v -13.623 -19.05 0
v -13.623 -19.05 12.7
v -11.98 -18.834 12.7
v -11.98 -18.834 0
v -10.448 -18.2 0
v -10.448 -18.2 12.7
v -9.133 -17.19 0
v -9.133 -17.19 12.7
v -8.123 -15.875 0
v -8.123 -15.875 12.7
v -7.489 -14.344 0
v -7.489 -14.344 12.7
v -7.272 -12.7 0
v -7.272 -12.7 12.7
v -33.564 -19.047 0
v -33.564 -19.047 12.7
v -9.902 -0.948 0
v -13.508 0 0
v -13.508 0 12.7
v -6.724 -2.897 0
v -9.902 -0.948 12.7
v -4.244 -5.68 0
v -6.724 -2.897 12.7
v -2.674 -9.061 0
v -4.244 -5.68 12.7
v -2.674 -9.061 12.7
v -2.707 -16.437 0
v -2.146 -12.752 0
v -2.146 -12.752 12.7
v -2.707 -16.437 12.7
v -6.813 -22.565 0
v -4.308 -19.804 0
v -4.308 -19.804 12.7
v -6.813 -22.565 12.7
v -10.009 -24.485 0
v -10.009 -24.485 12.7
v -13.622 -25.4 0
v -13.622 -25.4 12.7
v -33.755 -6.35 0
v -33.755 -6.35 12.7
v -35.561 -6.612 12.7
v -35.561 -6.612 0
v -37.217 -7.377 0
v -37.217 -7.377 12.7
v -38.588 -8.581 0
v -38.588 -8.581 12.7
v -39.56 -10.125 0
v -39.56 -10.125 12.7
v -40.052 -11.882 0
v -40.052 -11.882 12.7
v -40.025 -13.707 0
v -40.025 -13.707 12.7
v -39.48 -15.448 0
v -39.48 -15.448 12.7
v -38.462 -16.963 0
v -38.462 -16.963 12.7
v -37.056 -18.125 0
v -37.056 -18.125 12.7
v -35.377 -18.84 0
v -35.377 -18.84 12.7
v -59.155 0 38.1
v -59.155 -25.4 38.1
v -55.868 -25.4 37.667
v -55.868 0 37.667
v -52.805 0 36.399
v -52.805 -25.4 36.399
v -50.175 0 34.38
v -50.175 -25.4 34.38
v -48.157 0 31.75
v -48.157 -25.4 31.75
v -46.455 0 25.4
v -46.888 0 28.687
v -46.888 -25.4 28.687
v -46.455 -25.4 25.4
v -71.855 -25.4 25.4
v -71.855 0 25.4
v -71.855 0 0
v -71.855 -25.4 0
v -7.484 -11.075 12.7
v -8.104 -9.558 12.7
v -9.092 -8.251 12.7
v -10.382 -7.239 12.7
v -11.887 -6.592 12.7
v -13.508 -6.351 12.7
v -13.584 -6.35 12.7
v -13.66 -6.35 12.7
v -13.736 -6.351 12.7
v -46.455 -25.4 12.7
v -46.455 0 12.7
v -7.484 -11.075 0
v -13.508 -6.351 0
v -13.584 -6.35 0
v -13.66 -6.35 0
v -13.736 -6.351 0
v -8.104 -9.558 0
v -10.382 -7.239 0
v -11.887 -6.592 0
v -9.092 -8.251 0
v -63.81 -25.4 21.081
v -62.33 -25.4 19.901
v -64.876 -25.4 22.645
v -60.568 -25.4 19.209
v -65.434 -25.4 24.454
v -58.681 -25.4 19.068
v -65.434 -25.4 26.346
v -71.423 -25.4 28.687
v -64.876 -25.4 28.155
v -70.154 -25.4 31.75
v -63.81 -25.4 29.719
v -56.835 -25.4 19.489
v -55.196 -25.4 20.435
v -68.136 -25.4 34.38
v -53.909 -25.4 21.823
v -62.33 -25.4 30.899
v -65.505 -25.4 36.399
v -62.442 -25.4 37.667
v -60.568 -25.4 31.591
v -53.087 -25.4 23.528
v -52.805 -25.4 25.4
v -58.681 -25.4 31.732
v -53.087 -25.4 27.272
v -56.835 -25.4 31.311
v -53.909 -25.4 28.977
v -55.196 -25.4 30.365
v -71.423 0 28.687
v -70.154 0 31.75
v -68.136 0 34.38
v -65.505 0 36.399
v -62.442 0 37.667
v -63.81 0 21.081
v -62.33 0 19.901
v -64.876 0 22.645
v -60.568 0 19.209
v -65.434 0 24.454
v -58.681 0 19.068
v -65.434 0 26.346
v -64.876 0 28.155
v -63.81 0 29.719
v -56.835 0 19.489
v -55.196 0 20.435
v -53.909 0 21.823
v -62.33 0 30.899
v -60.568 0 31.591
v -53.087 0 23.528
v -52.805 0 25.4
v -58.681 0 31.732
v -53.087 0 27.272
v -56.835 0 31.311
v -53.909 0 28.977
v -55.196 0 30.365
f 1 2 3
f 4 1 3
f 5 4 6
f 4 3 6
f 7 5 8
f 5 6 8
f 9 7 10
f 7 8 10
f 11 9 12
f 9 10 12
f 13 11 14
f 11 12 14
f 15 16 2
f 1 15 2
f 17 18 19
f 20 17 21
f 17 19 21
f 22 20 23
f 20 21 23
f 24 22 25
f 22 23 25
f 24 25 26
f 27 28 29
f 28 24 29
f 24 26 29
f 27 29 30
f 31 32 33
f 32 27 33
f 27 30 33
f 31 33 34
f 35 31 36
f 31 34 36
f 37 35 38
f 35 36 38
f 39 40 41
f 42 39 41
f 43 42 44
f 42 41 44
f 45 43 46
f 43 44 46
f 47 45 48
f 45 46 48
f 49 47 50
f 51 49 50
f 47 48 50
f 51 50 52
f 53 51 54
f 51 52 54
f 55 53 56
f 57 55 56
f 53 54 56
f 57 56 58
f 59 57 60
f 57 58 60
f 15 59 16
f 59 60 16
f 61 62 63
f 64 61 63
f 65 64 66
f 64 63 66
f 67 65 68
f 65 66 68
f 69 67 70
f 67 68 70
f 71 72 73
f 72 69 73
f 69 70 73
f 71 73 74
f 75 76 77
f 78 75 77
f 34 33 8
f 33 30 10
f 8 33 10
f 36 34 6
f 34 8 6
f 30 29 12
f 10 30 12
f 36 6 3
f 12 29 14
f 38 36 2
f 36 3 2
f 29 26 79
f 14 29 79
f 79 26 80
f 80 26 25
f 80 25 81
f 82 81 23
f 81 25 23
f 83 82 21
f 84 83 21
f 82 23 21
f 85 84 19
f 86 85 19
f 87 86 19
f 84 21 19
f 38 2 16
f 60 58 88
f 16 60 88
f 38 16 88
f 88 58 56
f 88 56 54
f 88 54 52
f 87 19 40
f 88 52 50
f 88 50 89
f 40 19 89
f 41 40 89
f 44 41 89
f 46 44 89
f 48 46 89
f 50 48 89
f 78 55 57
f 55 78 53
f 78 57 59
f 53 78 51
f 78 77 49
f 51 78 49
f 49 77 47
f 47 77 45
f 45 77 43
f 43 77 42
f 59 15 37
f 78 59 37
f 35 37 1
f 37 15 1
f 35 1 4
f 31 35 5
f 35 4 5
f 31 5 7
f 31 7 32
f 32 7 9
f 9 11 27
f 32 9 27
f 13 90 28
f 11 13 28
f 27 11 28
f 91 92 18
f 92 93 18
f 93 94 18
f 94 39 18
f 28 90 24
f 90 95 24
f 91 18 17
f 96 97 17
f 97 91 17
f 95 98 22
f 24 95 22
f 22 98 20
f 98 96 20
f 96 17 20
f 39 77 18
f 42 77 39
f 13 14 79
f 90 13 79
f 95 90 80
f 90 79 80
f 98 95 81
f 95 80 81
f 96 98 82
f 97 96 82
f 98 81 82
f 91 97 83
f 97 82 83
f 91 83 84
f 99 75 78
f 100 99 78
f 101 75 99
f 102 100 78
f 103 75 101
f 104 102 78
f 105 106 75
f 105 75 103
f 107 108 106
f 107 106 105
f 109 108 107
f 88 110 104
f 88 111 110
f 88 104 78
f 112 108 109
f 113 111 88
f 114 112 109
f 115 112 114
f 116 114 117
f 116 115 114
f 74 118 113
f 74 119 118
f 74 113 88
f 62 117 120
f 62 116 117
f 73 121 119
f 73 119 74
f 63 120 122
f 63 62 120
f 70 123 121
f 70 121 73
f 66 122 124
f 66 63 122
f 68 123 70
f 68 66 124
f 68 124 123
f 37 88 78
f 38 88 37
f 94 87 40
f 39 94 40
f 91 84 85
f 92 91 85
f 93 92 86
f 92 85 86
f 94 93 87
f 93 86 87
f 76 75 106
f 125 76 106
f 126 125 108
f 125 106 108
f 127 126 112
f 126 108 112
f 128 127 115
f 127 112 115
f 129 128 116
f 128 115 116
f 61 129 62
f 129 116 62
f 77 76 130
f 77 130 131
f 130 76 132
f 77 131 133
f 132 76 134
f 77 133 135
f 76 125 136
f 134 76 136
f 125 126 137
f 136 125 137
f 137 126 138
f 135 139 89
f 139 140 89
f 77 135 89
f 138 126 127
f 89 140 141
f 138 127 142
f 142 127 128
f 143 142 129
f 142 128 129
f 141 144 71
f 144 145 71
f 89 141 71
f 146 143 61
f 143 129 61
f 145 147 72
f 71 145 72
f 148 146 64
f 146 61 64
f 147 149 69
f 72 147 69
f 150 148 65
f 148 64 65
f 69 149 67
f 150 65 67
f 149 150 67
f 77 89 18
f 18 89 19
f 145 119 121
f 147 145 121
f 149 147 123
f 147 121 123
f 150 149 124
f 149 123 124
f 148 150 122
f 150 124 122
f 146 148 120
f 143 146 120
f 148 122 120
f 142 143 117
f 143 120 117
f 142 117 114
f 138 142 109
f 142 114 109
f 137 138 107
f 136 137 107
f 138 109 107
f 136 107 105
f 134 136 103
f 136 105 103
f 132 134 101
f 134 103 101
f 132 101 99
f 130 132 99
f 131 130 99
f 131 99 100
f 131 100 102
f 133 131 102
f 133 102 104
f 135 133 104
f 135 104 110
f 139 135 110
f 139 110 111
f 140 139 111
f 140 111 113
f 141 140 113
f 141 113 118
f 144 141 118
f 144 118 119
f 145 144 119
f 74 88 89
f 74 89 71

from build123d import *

# Parameters (mm, degrees)
F1_DEPTH = 25.4
F2_R     = 6.35
F3_DEPTH = 25.401
F5_DEPTH = 25.401
F7_DEPTH = 12.701


# Not quite as in the source:
# - a feature names something its author has since deleted; it is built from what else it names


with BuildPart() as f1:
    # F0 (on Front) → F1 (new body)
    with BuildSketch(Plane.XZ):
        Polygon((-46.455263897, 38.1), (-71.855263897, 38.1), (-71.855263897, 0), (-2.005263897, 0), (-2.005263897, 12.7), (-46.455263897, 12.7), align=None)
    extrude(amount=F1_DEPTH)

    # F2 (on face) → F3 (cut, through all)
    with BuildSketch(Plane.XZ.offset(25.4)):
        with Locations((-59.155263897, 25.4)):
            Circle(F2_R)
    extrude(amount=-F3_DEPTH, mode=Mode.SUBTRACT)

    # F4 (on face) → F5 (cut, through all)
    with BuildSketch(Plane.XZ.offset(25.4)):
        with BuildLine():
            ThreePointArc((-71.855263897, 25.4), (-68.135520018, 34.3802561211), (-59.155263897, 38.1))
            Line((-59.155263897, 38.1), (-71.855263897, 38.1))
            Line((-71.855263897, 38.1), (-71.855263897, 25.4))
        make_face()
        with BuildLine():
            ThreePointArc((-59.155263897, 38.1), (-50.1750077759, 34.3802561211), (-46.455263897, 25.4))
            Line((-46.455263897, 25.4), (-46.455263897, 38.1))
            Line((-46.455263897, 38.1), (-59.155263897, 38.1))
        make_face()
    extrude(amount=-F5_DEPTH, mode=Mode.SUBTRACT)

    # F6 (on face) → F7 (cut, through all)
    with BuildSketch(Plane.XY.offset(12.7)):
        with BuildLine():
            ThreePointArc((-13.507871342, -6.3510340362), (-13.6221384518, -6.3500000083), (-13.7364056666, -6.3510223648))
            Line((-13.7364056666, -6.3510223648), (-13.507871342, -6.3510340362))
        make_face()
        with BuildLine():
            Line((-13.507871342, -6.3510340362), (-13.7364056666, -6.3510223648))
            ThreePointArc((-13.7364056666, -6.3510223648), (-19.9722112621, -12.7565139443), (-13.6233824013, -19.0499999334))
            ThreePointArc((-13.6233824013, -19.0499999334), (-9.1326598467, -17.1904531948), (-7.2724627495, -12.7))
            ThreePointArc((-7.2724627495, -12.7), (-9.0920016561, -8.2505705668), (-13.507871342, -6.3510340362))
        make_face()
        with BuildLine():
            ThreePointArc((-33.7549395993, -6.3500000083), (-29.2650211814, -8.2099865975), (-27.405263897, -12.7))
            ThreePointArc((-27.405263897, -12.7), (-29.1979362777, -17.1219073906), (-33.5637725492, -19.0471120255))
            Line((-33.5637725492, -19.0471120255), (-13.6233824013, -19.0499999334))
            ThreePointArc((-13.6233824013, -19.0499999334), (-19.9722112621, -12.7565139443), (-13.7364056666, -6.3510223648))
            Line((-13.7364056666, -6.3510223648), (-33.7549395993, -6.3500000083))
        make_face()
        with BuildLine():
            ThreePointArc((-33.5637725492, -19.0471120255), (-29.1979362777, -17.1219073906), (-27.405263897, -12.7))
            ThreePointArc((-27.405263897, -12.7), (-29.2650211814, -8.2099865975), (-33.7549395993, -6.3500000083))
            ThreePointArc((-33.7549395993, -6.3500000083), (-40.1045443054, -12.7955944315), (-33.5637725492, -19.0471120255))
        make_face()
        with BuildLine():
            ThreePointArc((-13.507871342, 0), (-2.1464755419, -12.7515151154), (-13.6224627495, -25.4))
            Line((-13.6224627495, -25.4), (-2.005263897, -25.4))
            Line((-2.005263897, -25.4), (-2.005263897, 0))
            Line((-2.005263897, 0), (-13.507871342, 0))
        make_face()
    extrude(amount=-F7_DEPTH, mode=Mode.SUBTRACT)


solid = f1.part
